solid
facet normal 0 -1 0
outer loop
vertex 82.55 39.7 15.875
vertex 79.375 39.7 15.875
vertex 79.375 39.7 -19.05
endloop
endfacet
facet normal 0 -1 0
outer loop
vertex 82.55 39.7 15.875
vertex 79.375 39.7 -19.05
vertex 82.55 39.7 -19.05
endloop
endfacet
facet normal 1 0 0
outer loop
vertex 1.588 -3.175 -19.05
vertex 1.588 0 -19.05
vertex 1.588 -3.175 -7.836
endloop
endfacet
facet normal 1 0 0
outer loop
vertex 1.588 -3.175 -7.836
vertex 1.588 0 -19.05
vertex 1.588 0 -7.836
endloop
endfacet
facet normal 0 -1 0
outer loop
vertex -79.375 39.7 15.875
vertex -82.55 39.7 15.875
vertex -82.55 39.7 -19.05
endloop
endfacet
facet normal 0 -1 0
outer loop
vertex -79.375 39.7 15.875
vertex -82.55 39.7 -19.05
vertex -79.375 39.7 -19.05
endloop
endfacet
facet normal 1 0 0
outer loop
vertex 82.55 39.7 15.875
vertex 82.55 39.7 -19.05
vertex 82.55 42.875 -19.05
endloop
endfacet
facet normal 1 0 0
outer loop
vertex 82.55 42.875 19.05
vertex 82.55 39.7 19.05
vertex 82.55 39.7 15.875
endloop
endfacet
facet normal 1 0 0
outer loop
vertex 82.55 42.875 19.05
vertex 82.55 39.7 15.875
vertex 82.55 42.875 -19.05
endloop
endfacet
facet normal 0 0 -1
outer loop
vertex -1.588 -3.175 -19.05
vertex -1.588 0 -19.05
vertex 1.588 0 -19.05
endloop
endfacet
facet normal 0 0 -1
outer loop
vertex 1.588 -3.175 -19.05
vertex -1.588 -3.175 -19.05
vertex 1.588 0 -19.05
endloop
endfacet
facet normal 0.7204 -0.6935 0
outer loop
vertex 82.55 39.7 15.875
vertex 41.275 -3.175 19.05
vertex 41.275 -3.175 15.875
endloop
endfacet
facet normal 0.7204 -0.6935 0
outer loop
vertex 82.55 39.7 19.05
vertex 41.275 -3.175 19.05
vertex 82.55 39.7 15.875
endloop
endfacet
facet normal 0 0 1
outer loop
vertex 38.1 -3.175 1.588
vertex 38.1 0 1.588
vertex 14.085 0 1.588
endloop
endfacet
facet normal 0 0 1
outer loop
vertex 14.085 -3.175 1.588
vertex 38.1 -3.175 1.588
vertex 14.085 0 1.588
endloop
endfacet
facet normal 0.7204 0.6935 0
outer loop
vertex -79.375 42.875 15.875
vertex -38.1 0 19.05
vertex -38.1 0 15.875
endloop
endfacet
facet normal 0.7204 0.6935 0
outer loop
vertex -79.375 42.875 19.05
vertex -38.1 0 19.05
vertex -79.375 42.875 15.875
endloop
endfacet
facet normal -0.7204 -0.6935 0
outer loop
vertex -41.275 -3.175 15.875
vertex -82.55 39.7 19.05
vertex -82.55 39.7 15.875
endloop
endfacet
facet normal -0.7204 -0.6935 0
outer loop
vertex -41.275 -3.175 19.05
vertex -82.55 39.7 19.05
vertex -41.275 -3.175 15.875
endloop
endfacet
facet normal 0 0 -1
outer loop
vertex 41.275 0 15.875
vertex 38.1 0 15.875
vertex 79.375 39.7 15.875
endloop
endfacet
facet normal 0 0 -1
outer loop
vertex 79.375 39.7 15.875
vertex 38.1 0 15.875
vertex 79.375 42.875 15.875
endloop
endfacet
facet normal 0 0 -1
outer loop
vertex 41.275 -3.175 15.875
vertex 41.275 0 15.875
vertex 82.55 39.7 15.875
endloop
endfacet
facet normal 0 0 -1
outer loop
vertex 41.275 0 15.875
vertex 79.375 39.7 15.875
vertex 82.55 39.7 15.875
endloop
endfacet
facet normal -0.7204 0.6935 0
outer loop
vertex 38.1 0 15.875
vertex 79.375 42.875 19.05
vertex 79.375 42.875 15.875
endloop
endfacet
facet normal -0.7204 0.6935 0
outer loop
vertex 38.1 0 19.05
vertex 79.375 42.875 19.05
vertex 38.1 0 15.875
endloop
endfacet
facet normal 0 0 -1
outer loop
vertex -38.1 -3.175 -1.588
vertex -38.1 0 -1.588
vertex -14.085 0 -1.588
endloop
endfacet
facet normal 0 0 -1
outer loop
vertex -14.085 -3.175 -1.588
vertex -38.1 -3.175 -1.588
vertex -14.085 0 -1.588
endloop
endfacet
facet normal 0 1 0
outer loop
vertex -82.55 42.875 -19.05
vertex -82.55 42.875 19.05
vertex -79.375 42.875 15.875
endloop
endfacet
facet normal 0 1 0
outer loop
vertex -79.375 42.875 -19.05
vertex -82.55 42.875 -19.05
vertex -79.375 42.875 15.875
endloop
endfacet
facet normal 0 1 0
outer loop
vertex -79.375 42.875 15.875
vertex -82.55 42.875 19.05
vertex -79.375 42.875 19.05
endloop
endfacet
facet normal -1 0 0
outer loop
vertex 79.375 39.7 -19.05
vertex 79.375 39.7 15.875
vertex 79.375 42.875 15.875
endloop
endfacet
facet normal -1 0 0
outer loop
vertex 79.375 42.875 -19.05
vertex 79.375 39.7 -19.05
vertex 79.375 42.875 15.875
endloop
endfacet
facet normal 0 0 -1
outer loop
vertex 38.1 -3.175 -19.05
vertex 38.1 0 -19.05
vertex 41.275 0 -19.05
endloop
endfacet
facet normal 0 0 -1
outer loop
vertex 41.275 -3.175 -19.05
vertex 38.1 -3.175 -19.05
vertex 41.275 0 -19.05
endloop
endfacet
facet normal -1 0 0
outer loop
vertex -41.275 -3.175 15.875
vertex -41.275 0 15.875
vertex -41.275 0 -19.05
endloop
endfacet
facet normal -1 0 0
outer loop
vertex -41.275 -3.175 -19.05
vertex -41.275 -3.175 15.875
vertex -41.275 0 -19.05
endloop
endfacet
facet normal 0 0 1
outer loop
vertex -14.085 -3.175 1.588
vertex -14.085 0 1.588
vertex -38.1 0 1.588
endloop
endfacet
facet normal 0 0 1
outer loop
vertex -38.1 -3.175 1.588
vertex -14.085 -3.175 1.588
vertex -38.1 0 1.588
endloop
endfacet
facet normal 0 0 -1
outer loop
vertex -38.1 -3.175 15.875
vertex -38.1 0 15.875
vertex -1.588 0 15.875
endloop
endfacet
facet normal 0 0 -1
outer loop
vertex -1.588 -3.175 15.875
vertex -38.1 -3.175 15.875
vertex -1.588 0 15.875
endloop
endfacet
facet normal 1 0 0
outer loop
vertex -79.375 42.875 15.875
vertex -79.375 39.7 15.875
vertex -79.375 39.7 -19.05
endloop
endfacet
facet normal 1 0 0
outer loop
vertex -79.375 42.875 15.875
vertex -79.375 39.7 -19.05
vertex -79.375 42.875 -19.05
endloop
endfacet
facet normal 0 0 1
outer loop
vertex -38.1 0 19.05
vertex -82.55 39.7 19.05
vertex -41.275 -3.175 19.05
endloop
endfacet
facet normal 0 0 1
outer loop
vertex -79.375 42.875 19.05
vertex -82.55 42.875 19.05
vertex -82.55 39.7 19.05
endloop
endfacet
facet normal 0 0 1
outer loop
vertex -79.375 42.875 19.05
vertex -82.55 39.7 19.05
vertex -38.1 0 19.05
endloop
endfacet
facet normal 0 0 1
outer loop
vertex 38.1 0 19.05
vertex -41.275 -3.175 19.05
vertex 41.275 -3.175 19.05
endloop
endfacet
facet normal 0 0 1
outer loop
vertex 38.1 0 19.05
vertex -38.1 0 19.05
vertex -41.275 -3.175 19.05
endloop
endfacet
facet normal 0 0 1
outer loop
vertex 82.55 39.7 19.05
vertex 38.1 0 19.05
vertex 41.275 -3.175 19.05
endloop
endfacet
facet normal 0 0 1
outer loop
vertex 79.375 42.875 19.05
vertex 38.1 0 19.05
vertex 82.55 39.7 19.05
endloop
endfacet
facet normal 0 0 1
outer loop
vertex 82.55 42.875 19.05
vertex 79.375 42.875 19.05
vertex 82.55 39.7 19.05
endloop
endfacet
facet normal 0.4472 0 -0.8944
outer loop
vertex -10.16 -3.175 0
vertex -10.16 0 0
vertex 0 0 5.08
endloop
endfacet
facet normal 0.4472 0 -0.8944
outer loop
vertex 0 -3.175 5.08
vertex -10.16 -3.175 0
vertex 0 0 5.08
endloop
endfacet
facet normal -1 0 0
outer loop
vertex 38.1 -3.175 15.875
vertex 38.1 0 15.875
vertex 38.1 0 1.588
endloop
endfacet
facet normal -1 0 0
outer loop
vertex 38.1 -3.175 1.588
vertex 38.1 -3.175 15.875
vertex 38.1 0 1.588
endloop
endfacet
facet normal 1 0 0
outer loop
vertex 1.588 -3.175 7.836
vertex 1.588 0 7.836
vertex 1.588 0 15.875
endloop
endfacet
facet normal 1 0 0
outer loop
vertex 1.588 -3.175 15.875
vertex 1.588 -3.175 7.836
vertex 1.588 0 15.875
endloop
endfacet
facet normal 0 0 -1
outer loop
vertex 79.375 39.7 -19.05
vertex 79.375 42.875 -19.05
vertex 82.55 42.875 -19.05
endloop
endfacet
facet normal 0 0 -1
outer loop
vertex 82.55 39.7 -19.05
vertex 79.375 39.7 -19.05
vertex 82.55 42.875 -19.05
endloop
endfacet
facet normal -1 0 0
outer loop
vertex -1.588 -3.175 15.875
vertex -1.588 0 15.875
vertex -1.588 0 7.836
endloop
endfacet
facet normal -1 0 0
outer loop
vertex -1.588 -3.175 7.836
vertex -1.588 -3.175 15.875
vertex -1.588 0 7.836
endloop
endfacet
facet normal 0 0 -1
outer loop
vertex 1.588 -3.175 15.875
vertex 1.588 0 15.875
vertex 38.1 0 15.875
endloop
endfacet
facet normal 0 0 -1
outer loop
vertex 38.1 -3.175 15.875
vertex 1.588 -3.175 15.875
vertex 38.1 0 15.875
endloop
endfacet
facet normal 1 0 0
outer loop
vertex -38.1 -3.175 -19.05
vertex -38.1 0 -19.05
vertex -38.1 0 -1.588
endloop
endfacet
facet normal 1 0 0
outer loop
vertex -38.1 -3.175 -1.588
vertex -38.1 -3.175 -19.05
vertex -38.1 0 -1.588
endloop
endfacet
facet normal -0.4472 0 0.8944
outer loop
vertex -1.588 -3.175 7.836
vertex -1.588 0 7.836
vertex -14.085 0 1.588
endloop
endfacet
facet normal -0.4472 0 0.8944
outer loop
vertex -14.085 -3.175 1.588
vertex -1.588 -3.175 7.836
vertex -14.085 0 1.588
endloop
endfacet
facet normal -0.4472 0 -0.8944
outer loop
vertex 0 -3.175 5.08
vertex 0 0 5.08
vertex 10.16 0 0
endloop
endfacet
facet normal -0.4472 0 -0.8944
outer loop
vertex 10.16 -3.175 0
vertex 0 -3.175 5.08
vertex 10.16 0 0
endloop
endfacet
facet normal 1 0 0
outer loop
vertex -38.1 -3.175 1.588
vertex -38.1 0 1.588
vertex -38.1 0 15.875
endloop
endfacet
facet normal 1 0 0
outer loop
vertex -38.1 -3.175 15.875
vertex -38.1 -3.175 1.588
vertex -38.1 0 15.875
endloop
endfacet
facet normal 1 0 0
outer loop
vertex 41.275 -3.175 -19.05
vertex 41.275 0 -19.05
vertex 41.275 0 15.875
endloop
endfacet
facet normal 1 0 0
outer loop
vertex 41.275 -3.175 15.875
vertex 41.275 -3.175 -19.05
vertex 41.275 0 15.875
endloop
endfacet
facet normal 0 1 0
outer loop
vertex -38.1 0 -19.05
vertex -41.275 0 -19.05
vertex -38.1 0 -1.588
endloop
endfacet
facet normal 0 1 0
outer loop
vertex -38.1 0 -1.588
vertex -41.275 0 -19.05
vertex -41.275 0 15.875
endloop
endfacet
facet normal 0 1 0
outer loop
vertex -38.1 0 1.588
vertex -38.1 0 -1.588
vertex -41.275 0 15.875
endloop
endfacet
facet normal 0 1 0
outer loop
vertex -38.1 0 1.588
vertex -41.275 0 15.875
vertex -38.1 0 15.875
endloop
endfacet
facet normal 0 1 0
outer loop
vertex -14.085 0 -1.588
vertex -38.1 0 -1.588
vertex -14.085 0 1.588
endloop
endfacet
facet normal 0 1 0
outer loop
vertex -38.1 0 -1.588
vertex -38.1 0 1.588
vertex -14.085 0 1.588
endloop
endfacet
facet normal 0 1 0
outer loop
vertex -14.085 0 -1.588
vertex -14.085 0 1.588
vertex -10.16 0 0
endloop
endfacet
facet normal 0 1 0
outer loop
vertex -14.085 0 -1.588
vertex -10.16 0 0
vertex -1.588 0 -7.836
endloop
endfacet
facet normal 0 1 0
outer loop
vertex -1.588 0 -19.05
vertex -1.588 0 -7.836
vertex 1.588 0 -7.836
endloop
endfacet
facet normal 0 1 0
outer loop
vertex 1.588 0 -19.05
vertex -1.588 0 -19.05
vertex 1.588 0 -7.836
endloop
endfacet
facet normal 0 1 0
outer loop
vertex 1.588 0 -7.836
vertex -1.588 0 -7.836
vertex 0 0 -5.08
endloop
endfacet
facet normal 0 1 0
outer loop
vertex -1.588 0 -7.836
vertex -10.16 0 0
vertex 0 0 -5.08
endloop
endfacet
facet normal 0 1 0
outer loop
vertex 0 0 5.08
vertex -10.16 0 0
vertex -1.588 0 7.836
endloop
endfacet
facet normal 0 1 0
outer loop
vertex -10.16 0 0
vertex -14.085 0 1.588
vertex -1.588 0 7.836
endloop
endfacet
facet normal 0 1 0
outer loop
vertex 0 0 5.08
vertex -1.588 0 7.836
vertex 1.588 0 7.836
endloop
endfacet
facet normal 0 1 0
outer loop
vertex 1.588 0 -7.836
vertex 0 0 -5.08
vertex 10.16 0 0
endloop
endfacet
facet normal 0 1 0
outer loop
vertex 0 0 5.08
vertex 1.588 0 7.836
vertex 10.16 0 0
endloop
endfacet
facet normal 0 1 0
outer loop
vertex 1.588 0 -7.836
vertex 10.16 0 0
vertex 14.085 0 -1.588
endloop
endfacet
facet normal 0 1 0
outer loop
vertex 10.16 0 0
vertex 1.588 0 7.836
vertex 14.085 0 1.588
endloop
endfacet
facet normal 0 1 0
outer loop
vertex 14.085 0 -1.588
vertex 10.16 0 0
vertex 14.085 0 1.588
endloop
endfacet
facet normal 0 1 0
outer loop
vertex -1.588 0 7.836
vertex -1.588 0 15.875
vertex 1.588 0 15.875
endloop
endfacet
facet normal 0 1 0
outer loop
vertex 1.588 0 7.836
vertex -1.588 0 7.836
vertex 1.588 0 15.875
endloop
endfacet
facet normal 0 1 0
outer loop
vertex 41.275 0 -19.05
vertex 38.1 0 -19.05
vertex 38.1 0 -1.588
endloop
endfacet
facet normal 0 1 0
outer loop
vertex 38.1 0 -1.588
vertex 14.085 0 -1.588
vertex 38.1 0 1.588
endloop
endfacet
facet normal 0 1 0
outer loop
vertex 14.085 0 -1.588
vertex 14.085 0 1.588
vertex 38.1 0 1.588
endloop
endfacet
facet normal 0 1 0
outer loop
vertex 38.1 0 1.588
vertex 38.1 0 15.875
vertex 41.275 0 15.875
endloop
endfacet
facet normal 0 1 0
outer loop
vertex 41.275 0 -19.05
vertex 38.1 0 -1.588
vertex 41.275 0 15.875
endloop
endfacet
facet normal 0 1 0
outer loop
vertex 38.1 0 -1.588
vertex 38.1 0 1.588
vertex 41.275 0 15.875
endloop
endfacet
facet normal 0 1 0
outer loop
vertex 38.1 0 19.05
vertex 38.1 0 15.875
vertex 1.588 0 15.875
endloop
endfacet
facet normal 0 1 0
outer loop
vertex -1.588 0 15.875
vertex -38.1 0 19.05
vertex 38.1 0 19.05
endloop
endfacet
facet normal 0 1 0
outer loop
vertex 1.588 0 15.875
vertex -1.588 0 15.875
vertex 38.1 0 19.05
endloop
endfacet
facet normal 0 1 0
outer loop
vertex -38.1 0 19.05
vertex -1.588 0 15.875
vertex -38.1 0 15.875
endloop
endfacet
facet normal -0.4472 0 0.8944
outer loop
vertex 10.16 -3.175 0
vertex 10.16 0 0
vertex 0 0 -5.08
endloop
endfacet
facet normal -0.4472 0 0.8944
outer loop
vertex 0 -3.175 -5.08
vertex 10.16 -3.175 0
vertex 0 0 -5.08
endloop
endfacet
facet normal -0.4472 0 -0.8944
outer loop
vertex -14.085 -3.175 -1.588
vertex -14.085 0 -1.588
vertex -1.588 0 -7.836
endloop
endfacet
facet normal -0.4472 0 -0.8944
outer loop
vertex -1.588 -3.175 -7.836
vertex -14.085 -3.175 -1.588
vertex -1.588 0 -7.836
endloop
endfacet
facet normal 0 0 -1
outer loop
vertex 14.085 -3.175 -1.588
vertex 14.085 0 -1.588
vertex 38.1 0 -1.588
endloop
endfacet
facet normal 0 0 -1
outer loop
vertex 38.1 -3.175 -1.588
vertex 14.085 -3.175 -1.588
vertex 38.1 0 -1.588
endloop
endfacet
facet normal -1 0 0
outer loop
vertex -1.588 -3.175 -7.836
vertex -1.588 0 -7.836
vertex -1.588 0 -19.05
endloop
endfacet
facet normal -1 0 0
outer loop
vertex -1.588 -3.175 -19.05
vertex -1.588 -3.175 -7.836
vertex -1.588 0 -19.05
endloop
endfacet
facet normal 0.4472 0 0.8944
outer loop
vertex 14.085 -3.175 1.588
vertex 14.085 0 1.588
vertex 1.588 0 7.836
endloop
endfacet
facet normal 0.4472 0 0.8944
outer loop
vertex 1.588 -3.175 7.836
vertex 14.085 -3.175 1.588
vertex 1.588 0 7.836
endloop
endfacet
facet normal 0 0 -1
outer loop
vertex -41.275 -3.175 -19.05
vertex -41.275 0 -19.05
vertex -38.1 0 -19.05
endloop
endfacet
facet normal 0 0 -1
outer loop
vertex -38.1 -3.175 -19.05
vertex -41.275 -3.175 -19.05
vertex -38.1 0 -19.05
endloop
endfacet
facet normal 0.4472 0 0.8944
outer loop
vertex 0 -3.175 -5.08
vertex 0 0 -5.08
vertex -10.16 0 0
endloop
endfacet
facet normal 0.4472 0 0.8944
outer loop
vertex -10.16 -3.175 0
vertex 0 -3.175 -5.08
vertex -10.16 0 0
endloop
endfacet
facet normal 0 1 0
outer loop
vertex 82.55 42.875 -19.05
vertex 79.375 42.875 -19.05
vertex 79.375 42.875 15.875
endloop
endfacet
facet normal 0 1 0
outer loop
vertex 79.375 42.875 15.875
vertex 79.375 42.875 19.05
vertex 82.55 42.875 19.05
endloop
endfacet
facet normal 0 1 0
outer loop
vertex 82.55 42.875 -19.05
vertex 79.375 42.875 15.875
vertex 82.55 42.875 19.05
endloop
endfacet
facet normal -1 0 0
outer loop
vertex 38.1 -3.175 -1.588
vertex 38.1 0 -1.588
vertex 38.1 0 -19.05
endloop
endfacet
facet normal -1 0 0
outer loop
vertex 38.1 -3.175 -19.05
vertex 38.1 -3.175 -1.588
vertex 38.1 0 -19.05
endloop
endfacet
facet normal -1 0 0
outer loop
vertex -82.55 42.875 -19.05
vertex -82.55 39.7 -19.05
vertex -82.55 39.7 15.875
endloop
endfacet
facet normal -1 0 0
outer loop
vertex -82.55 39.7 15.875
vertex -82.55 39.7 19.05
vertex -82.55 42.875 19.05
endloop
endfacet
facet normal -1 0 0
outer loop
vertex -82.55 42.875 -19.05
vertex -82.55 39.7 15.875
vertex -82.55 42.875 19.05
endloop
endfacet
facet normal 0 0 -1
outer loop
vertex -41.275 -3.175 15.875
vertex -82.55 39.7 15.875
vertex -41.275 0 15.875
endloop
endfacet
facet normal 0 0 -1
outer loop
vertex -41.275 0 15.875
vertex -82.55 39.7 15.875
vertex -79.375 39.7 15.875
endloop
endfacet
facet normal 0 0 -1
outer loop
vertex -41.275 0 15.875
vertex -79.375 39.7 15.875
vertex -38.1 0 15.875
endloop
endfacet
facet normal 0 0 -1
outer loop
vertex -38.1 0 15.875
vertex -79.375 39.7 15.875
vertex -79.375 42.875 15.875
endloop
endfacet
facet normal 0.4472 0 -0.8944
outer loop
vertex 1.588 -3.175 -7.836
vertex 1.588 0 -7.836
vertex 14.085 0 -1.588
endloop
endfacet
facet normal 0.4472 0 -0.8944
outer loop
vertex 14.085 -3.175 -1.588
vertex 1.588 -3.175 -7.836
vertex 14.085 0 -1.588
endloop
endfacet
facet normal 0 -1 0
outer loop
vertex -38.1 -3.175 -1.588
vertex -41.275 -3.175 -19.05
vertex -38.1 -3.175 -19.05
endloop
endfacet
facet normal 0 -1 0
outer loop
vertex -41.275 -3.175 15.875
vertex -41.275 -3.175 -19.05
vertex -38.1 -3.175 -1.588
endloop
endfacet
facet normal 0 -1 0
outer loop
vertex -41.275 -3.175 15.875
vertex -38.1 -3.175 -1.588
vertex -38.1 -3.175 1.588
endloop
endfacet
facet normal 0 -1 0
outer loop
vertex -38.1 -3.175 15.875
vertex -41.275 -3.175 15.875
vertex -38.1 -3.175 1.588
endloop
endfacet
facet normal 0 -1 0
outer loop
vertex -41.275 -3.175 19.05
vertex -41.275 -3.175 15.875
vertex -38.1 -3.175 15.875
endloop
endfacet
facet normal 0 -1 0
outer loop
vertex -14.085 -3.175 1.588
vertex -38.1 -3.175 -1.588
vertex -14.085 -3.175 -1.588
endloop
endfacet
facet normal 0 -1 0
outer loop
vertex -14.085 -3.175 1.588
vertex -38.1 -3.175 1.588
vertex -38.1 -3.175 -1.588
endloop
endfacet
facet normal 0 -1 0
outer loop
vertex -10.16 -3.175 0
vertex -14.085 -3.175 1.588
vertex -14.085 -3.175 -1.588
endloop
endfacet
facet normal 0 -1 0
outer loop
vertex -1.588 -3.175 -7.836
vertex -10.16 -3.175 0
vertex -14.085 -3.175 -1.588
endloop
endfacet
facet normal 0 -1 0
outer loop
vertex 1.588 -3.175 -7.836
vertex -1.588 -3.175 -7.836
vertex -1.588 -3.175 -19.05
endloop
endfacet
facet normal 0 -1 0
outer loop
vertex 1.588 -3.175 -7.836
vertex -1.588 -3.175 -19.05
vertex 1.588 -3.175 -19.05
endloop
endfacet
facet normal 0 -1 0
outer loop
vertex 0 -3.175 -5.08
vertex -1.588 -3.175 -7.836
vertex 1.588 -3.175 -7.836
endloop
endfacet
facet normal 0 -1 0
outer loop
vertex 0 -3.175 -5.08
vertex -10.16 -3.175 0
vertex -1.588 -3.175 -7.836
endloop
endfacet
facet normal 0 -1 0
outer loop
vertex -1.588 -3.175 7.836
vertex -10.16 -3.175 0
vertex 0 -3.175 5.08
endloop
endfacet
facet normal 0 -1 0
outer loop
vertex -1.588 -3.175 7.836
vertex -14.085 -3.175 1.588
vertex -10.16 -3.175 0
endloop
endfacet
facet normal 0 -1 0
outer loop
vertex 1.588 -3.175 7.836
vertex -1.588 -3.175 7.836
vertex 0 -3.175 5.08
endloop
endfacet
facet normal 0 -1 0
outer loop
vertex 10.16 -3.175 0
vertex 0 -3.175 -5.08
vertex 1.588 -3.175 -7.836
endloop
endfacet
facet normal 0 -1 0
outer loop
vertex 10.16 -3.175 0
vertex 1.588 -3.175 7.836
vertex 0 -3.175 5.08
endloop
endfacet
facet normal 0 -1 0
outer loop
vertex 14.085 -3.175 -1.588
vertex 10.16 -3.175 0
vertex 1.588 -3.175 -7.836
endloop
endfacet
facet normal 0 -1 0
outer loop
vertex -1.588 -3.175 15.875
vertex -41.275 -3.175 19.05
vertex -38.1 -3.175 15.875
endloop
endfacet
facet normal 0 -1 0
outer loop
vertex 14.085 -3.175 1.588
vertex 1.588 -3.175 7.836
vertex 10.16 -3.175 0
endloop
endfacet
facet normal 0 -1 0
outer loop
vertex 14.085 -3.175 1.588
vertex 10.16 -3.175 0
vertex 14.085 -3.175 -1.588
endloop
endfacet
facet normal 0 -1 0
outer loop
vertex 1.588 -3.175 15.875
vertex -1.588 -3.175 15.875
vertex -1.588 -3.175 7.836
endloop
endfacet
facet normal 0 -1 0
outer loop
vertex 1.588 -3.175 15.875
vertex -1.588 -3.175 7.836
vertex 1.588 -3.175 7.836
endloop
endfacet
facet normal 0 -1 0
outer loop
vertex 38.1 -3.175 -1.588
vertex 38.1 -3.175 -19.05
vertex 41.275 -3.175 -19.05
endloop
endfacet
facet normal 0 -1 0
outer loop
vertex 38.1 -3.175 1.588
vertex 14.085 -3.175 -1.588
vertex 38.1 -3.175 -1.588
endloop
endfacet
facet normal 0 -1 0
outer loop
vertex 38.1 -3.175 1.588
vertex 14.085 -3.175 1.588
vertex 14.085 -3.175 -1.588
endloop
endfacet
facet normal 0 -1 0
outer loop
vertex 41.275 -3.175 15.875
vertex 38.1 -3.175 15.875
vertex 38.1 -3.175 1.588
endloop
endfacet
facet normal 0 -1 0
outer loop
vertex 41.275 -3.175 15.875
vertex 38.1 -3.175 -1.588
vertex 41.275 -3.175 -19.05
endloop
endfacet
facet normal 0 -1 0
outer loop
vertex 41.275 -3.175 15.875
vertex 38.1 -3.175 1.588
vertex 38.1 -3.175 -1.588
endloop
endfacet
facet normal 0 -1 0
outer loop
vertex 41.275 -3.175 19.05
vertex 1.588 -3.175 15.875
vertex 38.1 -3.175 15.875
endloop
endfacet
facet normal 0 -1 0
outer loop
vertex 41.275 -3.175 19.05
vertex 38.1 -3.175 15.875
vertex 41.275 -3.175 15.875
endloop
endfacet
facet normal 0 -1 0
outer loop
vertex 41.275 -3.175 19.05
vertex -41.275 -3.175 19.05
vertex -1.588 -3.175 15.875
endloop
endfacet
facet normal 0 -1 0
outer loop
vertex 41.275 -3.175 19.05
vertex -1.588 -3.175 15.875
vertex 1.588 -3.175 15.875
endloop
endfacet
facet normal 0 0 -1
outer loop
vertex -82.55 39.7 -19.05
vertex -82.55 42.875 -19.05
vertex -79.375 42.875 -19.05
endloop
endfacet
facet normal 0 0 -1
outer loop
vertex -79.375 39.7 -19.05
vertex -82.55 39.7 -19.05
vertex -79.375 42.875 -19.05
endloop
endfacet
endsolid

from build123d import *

# Parameters (mm, degrees)
F1_DEPTH = 3.175
F3_DEPTH = 3.175
F4_W     = 3.175
F4_H     = 3.175
F5_DEPTH = 38.1


with BuildPart() as f1:
    # F0 (on Front) → F1 (new body)
    with BuildSketch(Plane.XZ):
        Polygon((41.275, -19.05), (41.275, 19.05), (-41.275, 19.05), (-41.275, -19.05), (-38.1, -19.05), (-38.1, -1.5875), (-14.0845158286, -1.5875), (-1.5875, -7.8360079143), (-1.5875, -19.05), (1.5875, -19.05), (1.5875, -7.8360079143), (14.0845158286, -1.5875), (38.1, -1.5875), (38.1, -19.05), align=None)
        Polygon((-38.1, 1.5875), (-38.1, 15.875), (-1.5875, 15.875), (-1.5875, 7.8360079143), (-14.0845158286, 1.5875), align=None, mode=Mode.SUBTRACT)
        Polygon((0, -5.08), (-10.16, 0), (0, 5.08), (10.16, 0), align=None, mode=Mode.SUBTRACT)
        Polygon((1.5875, 15.875), (38.1, 15.875), (38.1, 1.5875), (14.0845158286, 1.5875), (1.5875, 7.8360079143), align=None, mode=Mode.SUBTRACT)
    extrude(amount=F1_DEPTH)

    # F2 (on face) → F3 (join)
    with BuildSketch(Plane.XY.offset(19.05)):
        Polygon((-82.55, 39.7002), (-41.275, -3.175), (-41.275, 0), (-38.1, 0), (-79.375, 42.8752), (-79.375, 39.7002), align=None)
        Polygon((79.375, 42.8752), (38.1, 0), (41.275, 0), (41.275, -3.175), (82.55, 39.7002), (79.375, 39.7002), align=None)
    extrude(amount=-F3_DEPTH)

    # F4 (on face) → F5 (join)
    with BuildSketch(Plane.XY.offset(19.05)):
        with Locations((-80.9625, 41.2877)):
            Rectangle(F4_W, F4_H)
        with Locations((80.9625, 41.2877)):
            Rectangle(F4_W, F4_H)
    extrude(amount=-F5_DEPTH)


solid = f1.part
